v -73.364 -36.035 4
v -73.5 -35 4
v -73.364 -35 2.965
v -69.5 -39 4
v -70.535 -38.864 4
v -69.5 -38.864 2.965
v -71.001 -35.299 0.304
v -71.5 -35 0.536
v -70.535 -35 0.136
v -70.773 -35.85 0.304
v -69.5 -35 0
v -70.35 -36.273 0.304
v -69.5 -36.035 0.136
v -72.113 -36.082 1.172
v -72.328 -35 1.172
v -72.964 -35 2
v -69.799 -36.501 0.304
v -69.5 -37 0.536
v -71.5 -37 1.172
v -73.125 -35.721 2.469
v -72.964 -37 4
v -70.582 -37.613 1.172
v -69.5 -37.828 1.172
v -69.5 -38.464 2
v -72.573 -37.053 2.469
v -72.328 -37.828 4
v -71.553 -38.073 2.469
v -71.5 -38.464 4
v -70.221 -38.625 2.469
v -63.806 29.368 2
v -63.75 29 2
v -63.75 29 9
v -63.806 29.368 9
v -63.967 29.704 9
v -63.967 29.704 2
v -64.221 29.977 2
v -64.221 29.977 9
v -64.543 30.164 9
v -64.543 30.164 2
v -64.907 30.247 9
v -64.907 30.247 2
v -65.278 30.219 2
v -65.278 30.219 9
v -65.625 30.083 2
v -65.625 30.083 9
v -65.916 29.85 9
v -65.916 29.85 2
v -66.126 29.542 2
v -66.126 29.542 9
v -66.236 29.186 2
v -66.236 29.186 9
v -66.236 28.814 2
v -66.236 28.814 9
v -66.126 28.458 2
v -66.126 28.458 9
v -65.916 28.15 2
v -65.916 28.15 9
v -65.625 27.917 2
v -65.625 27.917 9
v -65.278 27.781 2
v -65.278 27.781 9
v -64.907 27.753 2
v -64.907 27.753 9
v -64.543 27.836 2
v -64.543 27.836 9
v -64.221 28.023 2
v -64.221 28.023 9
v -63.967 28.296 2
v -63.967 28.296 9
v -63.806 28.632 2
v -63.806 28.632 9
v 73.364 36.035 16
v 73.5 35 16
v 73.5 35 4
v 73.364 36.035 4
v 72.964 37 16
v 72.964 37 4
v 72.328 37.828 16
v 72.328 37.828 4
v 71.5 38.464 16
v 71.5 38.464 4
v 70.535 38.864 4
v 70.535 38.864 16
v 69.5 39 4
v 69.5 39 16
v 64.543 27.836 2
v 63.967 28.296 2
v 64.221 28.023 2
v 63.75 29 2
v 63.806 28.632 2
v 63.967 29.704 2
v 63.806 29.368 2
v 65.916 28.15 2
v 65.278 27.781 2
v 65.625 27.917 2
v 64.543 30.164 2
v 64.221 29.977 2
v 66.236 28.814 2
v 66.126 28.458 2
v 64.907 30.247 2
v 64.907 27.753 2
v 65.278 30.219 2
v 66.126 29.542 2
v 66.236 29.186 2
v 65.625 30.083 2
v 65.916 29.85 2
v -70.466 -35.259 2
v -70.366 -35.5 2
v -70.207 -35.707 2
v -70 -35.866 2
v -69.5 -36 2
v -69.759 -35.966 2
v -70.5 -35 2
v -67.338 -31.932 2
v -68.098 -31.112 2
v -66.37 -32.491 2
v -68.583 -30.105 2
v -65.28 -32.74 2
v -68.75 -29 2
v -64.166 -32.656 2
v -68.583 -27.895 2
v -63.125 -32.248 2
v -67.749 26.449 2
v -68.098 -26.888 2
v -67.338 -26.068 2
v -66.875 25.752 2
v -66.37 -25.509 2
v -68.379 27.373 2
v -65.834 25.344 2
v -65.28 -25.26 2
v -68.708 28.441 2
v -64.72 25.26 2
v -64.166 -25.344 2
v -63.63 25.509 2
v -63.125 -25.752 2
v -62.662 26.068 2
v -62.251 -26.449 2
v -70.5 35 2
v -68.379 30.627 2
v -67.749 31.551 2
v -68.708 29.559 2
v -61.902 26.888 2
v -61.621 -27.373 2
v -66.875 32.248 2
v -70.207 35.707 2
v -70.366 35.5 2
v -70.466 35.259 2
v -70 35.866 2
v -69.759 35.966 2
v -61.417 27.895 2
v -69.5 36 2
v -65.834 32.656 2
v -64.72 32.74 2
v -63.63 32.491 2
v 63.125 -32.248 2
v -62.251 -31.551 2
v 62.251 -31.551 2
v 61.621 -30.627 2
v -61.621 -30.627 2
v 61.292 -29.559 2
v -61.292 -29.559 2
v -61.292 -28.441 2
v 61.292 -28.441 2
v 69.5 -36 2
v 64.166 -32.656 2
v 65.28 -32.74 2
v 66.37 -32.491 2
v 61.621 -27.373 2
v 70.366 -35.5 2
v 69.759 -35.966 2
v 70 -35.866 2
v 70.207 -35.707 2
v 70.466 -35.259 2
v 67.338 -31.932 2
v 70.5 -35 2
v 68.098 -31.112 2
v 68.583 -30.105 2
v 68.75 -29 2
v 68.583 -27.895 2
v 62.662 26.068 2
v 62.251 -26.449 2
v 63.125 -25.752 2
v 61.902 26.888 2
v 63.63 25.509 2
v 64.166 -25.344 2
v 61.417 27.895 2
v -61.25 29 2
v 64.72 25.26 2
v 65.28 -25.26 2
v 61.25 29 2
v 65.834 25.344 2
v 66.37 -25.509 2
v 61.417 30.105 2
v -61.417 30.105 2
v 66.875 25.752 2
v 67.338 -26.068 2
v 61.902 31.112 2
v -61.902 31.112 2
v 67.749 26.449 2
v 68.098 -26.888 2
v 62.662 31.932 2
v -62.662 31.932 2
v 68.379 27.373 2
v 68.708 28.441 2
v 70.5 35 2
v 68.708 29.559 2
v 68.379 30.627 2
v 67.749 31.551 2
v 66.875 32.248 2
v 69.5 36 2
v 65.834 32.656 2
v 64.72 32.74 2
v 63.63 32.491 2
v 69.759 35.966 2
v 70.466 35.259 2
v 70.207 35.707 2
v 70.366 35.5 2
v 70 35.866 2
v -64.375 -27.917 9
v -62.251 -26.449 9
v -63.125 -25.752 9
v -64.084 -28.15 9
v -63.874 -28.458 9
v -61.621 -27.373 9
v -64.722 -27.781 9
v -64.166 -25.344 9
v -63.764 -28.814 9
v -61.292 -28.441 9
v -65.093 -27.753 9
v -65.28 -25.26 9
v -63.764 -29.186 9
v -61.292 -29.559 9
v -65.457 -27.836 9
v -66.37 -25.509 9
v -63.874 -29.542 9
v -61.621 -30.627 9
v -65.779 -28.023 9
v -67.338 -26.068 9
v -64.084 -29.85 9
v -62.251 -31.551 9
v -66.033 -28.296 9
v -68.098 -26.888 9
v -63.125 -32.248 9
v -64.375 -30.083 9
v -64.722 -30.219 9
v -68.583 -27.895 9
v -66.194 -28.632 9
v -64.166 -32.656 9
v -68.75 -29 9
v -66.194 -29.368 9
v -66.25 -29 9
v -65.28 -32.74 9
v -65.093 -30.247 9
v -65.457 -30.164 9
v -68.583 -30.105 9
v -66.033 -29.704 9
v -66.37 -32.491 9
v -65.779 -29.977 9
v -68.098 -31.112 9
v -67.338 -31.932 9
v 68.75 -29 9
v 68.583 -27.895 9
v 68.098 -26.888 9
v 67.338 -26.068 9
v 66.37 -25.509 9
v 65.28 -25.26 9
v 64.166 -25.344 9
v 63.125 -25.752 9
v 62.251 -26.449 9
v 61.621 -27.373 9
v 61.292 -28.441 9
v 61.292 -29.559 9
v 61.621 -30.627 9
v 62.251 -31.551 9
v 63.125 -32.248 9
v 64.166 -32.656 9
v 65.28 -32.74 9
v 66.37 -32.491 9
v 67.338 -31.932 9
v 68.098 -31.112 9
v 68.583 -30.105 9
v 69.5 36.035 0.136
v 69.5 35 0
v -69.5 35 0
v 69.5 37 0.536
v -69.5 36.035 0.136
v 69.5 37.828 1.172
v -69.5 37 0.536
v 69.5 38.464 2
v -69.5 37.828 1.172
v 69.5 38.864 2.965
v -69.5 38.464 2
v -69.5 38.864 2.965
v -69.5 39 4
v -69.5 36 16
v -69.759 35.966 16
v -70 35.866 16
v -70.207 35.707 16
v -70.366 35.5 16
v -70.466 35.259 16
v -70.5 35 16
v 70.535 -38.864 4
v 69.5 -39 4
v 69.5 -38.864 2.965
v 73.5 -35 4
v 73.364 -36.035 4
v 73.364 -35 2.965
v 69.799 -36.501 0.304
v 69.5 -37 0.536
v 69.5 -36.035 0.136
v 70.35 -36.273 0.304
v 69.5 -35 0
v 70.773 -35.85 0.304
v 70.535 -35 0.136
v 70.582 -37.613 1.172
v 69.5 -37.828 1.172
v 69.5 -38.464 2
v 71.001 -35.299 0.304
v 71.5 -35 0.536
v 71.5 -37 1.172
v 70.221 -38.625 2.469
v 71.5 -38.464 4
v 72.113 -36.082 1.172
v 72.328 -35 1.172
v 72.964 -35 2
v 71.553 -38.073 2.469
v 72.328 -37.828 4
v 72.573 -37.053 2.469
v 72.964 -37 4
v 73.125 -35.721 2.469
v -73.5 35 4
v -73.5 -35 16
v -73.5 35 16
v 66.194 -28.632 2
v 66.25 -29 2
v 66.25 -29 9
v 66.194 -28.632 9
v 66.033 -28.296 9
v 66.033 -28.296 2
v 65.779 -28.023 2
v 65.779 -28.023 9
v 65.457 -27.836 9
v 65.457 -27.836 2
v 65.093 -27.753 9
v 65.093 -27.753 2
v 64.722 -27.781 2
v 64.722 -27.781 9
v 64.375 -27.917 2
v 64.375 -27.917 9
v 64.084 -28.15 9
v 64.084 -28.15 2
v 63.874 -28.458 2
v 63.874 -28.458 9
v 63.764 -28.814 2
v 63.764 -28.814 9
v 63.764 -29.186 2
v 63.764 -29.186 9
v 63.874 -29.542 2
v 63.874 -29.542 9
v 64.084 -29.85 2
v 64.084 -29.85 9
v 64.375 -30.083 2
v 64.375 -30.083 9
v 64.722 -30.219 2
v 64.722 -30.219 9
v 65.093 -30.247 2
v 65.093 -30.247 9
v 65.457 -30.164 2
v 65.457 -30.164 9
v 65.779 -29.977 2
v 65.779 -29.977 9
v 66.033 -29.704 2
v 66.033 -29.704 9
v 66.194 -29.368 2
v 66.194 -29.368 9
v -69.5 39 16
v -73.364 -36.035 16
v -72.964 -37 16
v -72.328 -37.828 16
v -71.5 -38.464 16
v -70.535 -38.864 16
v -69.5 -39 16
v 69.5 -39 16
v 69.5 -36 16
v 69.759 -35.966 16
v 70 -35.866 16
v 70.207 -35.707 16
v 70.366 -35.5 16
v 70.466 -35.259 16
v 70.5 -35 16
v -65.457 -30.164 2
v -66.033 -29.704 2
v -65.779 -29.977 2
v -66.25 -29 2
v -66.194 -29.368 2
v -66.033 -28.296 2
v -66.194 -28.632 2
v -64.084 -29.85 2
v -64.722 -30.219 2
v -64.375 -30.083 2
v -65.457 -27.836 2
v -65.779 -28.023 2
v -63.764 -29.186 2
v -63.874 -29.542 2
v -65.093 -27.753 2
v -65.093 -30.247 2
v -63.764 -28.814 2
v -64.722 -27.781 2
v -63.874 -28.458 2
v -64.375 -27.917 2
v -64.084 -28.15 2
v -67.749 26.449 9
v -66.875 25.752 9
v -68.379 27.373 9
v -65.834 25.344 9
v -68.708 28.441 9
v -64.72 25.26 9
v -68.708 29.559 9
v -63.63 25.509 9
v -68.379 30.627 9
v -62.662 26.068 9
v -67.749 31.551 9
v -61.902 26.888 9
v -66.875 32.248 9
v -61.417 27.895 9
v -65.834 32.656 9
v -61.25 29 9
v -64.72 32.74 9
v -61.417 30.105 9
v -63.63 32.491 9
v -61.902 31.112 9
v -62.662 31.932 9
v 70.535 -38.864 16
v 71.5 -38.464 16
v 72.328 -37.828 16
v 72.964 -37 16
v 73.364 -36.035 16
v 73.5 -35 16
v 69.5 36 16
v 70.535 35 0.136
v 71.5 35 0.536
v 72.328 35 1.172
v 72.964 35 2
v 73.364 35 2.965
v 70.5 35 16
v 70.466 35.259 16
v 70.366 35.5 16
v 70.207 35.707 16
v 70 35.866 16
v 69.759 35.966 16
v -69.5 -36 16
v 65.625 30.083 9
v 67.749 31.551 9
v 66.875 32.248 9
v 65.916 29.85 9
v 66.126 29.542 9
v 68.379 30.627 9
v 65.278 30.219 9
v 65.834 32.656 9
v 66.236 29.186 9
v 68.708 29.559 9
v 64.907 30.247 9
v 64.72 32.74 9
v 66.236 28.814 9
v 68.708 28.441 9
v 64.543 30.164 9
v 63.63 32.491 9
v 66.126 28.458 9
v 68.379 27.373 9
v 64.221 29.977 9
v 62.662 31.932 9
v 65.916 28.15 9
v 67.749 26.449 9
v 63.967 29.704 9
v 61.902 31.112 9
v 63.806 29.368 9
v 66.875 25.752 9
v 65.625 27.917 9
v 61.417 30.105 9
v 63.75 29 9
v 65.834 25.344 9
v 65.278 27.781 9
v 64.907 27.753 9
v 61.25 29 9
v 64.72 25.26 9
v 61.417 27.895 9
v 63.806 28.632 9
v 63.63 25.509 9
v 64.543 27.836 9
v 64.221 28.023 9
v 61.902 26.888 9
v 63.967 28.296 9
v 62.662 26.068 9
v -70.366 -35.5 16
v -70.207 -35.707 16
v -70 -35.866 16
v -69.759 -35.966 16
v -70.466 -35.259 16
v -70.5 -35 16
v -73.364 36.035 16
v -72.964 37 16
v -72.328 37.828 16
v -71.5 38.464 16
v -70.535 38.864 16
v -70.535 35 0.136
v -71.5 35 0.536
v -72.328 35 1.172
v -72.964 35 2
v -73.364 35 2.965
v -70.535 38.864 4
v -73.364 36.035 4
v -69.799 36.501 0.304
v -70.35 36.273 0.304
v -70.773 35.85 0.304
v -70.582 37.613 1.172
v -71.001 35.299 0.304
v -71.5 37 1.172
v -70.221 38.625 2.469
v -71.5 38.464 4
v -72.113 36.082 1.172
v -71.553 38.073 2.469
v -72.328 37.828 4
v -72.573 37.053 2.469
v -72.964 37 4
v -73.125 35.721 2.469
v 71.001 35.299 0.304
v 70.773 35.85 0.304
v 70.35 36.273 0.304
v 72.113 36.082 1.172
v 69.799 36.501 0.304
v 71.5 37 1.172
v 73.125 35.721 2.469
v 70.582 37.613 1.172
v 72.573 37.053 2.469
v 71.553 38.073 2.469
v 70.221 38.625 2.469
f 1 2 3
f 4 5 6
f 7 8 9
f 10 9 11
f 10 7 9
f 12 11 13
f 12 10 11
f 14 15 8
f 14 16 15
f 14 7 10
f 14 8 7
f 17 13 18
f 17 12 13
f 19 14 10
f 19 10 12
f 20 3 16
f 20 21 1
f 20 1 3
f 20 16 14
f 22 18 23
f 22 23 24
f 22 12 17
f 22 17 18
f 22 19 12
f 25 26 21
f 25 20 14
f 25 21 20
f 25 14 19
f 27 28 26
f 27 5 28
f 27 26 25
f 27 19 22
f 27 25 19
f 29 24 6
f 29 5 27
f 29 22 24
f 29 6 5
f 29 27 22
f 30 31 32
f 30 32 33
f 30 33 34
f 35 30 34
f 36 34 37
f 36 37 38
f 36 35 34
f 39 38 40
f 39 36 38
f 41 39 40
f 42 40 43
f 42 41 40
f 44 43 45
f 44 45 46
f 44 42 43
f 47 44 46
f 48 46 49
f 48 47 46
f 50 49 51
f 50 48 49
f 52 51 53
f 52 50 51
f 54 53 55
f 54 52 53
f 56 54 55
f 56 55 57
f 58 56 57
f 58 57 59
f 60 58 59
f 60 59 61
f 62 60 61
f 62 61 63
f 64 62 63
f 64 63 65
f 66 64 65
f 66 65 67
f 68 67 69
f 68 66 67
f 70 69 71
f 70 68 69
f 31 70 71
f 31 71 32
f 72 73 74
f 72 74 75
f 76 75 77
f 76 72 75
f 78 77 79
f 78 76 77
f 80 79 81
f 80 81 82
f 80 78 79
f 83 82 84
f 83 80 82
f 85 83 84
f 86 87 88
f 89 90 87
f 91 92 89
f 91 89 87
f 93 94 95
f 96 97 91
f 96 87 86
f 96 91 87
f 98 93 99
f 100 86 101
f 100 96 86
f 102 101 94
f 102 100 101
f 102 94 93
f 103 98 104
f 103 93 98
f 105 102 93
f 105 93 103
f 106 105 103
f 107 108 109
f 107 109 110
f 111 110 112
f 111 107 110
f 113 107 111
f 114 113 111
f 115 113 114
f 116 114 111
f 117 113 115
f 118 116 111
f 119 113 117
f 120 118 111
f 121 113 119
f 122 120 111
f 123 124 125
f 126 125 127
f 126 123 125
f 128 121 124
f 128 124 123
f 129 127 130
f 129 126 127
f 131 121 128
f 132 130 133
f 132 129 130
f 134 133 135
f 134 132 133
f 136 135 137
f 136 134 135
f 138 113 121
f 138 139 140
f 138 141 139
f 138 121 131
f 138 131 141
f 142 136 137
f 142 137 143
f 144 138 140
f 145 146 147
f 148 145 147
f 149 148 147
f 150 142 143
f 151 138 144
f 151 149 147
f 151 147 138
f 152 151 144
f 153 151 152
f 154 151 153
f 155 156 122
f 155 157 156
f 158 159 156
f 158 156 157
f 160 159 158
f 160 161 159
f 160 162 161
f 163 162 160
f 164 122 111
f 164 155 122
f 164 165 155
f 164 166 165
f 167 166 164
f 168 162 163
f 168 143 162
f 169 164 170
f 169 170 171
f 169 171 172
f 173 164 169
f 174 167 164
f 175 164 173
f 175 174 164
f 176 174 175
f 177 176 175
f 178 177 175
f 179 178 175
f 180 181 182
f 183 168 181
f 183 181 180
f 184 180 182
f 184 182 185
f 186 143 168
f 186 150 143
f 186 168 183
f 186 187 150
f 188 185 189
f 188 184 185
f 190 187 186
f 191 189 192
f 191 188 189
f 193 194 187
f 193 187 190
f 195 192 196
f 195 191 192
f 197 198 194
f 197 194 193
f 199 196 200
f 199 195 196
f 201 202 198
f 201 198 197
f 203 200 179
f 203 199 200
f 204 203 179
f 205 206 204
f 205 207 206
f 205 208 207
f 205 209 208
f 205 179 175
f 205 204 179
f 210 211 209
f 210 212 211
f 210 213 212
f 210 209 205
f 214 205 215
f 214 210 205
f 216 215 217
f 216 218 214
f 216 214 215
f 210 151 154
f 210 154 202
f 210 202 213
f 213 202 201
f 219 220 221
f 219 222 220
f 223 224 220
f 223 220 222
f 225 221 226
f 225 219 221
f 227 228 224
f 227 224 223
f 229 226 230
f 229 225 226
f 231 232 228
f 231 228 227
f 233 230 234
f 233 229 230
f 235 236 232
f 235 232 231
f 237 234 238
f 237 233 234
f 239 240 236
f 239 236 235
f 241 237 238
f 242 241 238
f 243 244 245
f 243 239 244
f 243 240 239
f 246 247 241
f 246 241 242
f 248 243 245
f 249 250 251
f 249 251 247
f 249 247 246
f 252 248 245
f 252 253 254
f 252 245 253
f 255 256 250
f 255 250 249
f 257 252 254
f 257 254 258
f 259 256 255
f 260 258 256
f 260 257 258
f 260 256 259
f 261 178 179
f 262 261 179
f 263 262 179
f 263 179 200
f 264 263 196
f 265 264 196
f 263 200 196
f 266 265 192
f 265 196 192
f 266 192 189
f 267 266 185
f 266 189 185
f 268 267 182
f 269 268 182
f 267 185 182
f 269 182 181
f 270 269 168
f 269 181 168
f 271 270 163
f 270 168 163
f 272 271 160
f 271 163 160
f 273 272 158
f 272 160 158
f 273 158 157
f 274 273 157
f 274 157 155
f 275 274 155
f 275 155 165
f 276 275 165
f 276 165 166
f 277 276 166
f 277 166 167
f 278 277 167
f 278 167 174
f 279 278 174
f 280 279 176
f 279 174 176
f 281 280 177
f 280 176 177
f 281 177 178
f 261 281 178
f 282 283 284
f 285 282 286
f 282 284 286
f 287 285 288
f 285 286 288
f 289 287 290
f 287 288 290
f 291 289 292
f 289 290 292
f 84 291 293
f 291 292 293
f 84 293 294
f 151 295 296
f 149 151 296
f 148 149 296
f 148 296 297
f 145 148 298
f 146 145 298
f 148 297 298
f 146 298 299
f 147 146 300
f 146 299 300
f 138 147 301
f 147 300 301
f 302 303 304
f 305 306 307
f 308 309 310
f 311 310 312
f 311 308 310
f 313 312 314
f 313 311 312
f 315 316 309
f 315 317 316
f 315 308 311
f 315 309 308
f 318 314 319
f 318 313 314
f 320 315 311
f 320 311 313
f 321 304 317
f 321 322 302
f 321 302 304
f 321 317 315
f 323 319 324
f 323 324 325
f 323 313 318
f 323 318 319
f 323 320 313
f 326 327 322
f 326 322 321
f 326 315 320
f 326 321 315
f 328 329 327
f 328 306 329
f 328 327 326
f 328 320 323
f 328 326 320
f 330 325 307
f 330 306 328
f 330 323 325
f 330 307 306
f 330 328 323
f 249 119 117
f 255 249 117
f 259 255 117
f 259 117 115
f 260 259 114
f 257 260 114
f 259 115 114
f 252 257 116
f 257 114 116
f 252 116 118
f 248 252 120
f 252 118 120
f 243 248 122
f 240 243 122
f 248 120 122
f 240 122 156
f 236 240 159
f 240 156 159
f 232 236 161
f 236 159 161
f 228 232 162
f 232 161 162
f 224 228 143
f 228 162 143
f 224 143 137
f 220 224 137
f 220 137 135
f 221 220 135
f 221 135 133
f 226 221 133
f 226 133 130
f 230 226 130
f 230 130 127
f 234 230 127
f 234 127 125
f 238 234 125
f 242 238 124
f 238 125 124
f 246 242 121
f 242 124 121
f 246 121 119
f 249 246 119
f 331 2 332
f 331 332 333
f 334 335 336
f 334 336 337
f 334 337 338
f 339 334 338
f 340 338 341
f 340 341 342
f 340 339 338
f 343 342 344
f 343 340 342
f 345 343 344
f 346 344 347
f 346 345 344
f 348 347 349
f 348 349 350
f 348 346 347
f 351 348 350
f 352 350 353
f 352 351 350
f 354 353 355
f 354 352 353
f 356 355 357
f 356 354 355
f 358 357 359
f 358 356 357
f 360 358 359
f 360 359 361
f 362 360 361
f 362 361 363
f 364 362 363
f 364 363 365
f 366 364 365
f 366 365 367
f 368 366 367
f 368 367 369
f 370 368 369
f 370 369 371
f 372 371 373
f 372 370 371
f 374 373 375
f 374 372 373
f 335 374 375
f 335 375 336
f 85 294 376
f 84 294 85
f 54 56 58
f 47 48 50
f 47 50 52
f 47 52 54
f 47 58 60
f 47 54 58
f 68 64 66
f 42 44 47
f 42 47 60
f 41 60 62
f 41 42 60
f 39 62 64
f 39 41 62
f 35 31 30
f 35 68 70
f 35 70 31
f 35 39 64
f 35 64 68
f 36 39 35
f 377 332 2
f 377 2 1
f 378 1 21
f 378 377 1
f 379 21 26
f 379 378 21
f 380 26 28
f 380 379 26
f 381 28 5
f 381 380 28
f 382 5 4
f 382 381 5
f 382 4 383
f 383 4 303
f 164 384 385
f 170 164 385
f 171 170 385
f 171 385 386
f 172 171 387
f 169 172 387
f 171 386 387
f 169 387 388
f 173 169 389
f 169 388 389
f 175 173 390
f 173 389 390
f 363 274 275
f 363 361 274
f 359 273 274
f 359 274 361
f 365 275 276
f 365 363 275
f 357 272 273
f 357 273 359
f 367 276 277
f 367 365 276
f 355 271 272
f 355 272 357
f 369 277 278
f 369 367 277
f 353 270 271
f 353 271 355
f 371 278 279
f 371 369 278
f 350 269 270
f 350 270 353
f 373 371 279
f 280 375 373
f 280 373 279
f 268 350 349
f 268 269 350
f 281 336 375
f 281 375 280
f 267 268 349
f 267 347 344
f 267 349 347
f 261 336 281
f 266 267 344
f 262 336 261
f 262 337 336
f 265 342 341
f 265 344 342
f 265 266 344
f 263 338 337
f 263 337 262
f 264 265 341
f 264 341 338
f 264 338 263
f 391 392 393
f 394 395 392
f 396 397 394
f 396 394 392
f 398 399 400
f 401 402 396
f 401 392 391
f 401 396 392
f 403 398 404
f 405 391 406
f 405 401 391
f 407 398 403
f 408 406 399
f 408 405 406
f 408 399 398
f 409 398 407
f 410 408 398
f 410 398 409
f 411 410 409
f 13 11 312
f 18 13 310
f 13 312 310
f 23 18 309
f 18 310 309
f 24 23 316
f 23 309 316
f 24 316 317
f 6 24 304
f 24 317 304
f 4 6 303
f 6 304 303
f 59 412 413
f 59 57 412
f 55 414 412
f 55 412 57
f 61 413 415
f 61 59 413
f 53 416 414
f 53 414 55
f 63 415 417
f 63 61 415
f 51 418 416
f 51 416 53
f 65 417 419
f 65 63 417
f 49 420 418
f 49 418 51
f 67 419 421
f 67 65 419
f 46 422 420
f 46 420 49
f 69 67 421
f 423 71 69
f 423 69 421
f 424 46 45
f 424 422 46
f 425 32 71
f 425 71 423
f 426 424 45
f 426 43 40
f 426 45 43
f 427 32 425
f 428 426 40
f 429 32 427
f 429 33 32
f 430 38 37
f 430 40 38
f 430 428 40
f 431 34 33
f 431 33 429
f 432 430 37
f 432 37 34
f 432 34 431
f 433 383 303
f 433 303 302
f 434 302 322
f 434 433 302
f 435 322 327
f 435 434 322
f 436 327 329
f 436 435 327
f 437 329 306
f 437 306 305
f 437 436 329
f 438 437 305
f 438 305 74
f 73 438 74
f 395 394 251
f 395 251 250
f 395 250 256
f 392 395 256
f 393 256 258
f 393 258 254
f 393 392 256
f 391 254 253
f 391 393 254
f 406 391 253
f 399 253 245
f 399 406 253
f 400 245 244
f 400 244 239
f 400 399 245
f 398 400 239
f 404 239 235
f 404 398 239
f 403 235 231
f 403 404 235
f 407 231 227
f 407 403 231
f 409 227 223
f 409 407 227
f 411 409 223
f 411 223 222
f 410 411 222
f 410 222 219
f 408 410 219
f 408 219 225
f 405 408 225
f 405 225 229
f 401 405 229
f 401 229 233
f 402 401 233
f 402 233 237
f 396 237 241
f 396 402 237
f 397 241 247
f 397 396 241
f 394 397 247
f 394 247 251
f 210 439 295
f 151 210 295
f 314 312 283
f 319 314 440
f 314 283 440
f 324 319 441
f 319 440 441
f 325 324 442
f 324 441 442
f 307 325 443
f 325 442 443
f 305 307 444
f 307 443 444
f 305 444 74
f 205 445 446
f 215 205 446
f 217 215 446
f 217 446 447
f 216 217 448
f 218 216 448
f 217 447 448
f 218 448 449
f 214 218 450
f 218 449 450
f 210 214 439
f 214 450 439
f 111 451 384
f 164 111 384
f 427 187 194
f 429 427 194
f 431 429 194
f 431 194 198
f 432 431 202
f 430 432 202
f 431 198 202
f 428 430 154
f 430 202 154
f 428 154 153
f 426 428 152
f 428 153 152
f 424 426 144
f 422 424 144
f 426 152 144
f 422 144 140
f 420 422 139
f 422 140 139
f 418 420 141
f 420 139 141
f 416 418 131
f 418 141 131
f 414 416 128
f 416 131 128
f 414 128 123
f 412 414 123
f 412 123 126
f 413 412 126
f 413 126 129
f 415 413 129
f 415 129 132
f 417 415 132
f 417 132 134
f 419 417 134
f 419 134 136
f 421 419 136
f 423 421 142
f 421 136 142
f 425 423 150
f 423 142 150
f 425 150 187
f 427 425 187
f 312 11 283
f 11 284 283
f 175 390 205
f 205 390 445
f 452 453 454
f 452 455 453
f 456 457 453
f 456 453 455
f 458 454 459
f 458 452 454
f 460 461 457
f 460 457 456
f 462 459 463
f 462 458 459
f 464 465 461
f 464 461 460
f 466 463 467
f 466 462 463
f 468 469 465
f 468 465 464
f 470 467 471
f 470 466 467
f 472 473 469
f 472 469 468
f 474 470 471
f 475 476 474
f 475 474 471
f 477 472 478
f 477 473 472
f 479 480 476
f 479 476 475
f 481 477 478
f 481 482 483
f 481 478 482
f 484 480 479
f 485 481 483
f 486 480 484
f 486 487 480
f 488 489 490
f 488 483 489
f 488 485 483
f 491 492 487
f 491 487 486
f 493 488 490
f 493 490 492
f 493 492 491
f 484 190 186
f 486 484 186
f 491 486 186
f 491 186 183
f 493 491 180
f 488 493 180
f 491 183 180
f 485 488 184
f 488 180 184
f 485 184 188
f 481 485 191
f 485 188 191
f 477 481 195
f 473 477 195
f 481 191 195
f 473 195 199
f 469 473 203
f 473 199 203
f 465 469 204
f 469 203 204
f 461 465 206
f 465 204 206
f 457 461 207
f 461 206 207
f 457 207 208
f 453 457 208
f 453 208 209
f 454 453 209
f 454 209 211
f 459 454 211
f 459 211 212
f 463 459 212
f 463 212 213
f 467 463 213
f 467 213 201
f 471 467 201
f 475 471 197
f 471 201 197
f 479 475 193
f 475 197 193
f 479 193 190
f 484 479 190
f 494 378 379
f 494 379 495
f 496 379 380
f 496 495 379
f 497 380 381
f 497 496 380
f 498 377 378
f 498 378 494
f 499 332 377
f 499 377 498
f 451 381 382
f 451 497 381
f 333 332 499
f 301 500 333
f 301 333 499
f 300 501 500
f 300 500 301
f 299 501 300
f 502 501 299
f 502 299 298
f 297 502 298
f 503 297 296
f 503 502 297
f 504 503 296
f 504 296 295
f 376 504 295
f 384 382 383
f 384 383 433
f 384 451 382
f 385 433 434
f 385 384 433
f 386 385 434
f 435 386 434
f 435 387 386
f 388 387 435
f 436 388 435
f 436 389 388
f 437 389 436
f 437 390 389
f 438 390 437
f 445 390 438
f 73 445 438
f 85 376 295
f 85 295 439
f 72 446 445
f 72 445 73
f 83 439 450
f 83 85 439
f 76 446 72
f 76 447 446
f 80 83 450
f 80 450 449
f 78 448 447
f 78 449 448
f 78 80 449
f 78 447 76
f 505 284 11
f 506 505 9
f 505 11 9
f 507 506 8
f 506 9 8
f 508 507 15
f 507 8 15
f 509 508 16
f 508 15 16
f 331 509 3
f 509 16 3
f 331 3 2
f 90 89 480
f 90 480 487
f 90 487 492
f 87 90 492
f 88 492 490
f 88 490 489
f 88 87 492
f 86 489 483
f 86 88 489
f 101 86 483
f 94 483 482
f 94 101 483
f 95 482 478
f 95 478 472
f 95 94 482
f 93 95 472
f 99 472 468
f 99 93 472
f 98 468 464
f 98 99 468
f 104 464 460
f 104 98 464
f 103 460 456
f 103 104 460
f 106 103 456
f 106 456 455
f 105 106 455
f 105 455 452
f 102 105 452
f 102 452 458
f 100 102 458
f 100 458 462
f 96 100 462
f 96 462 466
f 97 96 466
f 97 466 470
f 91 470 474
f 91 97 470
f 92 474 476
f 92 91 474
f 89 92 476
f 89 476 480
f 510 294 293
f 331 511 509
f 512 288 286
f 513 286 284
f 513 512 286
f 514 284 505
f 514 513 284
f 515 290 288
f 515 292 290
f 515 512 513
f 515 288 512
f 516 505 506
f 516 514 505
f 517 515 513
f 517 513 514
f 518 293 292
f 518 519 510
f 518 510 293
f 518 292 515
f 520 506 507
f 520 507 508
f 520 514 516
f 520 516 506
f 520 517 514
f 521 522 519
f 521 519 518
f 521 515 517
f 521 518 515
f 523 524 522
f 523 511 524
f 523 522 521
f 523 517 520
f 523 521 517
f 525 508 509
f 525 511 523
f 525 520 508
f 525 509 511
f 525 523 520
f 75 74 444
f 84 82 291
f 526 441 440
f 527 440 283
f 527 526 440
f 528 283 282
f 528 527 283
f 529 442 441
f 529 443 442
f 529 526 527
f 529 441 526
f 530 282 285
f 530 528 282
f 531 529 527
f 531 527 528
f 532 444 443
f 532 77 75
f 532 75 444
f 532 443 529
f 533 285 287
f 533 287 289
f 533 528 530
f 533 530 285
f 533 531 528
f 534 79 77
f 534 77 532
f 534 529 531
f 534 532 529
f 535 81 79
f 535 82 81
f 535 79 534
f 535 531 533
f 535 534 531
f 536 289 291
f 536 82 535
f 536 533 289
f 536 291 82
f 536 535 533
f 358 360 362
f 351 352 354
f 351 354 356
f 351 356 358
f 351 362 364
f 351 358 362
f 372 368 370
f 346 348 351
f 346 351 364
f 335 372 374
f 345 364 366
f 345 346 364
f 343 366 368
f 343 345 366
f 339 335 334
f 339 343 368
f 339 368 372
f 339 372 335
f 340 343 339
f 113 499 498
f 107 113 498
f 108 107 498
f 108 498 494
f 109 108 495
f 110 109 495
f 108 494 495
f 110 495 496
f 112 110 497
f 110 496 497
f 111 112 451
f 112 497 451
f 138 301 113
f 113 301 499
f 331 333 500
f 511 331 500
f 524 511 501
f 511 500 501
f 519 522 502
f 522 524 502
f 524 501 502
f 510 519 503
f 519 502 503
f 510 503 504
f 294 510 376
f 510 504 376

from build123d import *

# Parameters (mm, degrees)
SKETCH1_W           = 147
SKETCH1_H           = 78
BOSS_EXTRUDE1_DEPTH = 16
FILLET1_R           = 4
FILLET2_R           = 4
CUT_EXTRUDE1_DEPTH  = 14
SKETCH3_R           = 3.75
SKETCH3_R_2         = 1.25
BOSS_EXTRUDE2_DEPTH = 7


with BuildPart() as part:
    # Sketch1 → Boss-Extrude1 (new body)
    with BuildSketch(Plane.XY):
        Rectangle(SKETCH1_W, SKETCH1_H)
    extrude(amount=BOSS_EXTRUDE1_DEPTH)

    # Fillet1
    fillet1_edges = [part.edges().sort_by_distance(p)[0] for p in [
        (73.5, -39, 8),
        (-73.5, -39, 8),
        (-73.5, 39, 8),
        (73.5, 39, 8),
    ]]
    fillet(fillet1_edges, radius=FILLET1_R)

    # Fillet2
    fillet2_edges = [part.edges().sort_by_distance(p)[0] for p in [
        (0, -39, 0),
        (73.5, 0, 0),
        (-73.5, 0, 0),
        (0, 39, 0),
        (-72.328427125, 37.828427125, 0),
        (72.328427125, 37.828427125, 0),
        (72.328427125, -37.828427125, 0),
        (-72.328427125, -37.828427125, 0),
    ]]
    fillet(fillet2_edges, radius=FILLET2_R)

    # Sketch2 → Cut-Extrude1 (cut)
    with BuildSketch(Plane.XY.offset(16)):
        with BuildLine():
            Line((-70.5, 35), (-70.5, -35))
            ThreePointArc((-70.5, -35), (-70.207106781, -35.707106781), (-69.5, -36))
            Line((-69.5, -36), (69.5, -36))
            ThreePointArc((69.5, -36), (70.207106781, -35.707106781), (70.5, -35))
            Line((70.5, -35), (70.5, 35))
            ThreePointArc((70.5, 35), (70.207106781, 35.707106781), (69.5, 36))
            Line((69.5, 36), (-69.5, 36))
            ThreePointArc((-69.5, 36), (-70.207106781, 35.707106781), (-70.5, 35))
        make_face()
    extrude(amount=-CUT_EXTRUDE1_DEPTH, mode=Mode.SUBTRACT)

    # Sketch3 → Boss-Extrude2 (add)
    # profile 1 of 4: a face of its own
    with BuildSketch(Plane.XY.offset(2)):
        with Locations((-65, 29)):
            Circle(SKETCH3_R)
        with Locations((-65, 29)):
            Circle(SKETCH3_R_2, mode=Mode.SUBTRACT)
    # profile 2 of 4: a face of its own
    with BuildSketch(Plane.XY.offset(2)):
        with Locations(Location((65, 29, 0), (0, 0, 180))):
            Circle(SKETCH3_R)
        with Locations(Location((65, 29, 0), (0, 0, 180))):
            Circle(SKETCH3_R_2, mode=Mode.SUBTRACT)
    # profile 3 of 4: a face of its own
    with BuildSketch(Plane.XY.offset(2)):
        with Locations((65, -29)):
            Circle(SKETCH3_R)
        with Locations((65, -29)):
            Circle(SKETCH3_R_2, mode=Mode.SUBTRACT)
    # profile 4 of 4: a face of its own
    with BuildSketch(Plane.XY.offset(2)):
        with Locations(Location((-65, -29, 0), (0, 0, 180))):
            Circle(SKETCH3_R)
        with Locations(Location((-65, -29, 0), (0, 0, 180))):
            Circle(SKETCH3_R_2, mode=Mode.SUBTRACT)
    extrude(amount=BOSS_EXTRUDE2_DEPTH)


solid = part.part
